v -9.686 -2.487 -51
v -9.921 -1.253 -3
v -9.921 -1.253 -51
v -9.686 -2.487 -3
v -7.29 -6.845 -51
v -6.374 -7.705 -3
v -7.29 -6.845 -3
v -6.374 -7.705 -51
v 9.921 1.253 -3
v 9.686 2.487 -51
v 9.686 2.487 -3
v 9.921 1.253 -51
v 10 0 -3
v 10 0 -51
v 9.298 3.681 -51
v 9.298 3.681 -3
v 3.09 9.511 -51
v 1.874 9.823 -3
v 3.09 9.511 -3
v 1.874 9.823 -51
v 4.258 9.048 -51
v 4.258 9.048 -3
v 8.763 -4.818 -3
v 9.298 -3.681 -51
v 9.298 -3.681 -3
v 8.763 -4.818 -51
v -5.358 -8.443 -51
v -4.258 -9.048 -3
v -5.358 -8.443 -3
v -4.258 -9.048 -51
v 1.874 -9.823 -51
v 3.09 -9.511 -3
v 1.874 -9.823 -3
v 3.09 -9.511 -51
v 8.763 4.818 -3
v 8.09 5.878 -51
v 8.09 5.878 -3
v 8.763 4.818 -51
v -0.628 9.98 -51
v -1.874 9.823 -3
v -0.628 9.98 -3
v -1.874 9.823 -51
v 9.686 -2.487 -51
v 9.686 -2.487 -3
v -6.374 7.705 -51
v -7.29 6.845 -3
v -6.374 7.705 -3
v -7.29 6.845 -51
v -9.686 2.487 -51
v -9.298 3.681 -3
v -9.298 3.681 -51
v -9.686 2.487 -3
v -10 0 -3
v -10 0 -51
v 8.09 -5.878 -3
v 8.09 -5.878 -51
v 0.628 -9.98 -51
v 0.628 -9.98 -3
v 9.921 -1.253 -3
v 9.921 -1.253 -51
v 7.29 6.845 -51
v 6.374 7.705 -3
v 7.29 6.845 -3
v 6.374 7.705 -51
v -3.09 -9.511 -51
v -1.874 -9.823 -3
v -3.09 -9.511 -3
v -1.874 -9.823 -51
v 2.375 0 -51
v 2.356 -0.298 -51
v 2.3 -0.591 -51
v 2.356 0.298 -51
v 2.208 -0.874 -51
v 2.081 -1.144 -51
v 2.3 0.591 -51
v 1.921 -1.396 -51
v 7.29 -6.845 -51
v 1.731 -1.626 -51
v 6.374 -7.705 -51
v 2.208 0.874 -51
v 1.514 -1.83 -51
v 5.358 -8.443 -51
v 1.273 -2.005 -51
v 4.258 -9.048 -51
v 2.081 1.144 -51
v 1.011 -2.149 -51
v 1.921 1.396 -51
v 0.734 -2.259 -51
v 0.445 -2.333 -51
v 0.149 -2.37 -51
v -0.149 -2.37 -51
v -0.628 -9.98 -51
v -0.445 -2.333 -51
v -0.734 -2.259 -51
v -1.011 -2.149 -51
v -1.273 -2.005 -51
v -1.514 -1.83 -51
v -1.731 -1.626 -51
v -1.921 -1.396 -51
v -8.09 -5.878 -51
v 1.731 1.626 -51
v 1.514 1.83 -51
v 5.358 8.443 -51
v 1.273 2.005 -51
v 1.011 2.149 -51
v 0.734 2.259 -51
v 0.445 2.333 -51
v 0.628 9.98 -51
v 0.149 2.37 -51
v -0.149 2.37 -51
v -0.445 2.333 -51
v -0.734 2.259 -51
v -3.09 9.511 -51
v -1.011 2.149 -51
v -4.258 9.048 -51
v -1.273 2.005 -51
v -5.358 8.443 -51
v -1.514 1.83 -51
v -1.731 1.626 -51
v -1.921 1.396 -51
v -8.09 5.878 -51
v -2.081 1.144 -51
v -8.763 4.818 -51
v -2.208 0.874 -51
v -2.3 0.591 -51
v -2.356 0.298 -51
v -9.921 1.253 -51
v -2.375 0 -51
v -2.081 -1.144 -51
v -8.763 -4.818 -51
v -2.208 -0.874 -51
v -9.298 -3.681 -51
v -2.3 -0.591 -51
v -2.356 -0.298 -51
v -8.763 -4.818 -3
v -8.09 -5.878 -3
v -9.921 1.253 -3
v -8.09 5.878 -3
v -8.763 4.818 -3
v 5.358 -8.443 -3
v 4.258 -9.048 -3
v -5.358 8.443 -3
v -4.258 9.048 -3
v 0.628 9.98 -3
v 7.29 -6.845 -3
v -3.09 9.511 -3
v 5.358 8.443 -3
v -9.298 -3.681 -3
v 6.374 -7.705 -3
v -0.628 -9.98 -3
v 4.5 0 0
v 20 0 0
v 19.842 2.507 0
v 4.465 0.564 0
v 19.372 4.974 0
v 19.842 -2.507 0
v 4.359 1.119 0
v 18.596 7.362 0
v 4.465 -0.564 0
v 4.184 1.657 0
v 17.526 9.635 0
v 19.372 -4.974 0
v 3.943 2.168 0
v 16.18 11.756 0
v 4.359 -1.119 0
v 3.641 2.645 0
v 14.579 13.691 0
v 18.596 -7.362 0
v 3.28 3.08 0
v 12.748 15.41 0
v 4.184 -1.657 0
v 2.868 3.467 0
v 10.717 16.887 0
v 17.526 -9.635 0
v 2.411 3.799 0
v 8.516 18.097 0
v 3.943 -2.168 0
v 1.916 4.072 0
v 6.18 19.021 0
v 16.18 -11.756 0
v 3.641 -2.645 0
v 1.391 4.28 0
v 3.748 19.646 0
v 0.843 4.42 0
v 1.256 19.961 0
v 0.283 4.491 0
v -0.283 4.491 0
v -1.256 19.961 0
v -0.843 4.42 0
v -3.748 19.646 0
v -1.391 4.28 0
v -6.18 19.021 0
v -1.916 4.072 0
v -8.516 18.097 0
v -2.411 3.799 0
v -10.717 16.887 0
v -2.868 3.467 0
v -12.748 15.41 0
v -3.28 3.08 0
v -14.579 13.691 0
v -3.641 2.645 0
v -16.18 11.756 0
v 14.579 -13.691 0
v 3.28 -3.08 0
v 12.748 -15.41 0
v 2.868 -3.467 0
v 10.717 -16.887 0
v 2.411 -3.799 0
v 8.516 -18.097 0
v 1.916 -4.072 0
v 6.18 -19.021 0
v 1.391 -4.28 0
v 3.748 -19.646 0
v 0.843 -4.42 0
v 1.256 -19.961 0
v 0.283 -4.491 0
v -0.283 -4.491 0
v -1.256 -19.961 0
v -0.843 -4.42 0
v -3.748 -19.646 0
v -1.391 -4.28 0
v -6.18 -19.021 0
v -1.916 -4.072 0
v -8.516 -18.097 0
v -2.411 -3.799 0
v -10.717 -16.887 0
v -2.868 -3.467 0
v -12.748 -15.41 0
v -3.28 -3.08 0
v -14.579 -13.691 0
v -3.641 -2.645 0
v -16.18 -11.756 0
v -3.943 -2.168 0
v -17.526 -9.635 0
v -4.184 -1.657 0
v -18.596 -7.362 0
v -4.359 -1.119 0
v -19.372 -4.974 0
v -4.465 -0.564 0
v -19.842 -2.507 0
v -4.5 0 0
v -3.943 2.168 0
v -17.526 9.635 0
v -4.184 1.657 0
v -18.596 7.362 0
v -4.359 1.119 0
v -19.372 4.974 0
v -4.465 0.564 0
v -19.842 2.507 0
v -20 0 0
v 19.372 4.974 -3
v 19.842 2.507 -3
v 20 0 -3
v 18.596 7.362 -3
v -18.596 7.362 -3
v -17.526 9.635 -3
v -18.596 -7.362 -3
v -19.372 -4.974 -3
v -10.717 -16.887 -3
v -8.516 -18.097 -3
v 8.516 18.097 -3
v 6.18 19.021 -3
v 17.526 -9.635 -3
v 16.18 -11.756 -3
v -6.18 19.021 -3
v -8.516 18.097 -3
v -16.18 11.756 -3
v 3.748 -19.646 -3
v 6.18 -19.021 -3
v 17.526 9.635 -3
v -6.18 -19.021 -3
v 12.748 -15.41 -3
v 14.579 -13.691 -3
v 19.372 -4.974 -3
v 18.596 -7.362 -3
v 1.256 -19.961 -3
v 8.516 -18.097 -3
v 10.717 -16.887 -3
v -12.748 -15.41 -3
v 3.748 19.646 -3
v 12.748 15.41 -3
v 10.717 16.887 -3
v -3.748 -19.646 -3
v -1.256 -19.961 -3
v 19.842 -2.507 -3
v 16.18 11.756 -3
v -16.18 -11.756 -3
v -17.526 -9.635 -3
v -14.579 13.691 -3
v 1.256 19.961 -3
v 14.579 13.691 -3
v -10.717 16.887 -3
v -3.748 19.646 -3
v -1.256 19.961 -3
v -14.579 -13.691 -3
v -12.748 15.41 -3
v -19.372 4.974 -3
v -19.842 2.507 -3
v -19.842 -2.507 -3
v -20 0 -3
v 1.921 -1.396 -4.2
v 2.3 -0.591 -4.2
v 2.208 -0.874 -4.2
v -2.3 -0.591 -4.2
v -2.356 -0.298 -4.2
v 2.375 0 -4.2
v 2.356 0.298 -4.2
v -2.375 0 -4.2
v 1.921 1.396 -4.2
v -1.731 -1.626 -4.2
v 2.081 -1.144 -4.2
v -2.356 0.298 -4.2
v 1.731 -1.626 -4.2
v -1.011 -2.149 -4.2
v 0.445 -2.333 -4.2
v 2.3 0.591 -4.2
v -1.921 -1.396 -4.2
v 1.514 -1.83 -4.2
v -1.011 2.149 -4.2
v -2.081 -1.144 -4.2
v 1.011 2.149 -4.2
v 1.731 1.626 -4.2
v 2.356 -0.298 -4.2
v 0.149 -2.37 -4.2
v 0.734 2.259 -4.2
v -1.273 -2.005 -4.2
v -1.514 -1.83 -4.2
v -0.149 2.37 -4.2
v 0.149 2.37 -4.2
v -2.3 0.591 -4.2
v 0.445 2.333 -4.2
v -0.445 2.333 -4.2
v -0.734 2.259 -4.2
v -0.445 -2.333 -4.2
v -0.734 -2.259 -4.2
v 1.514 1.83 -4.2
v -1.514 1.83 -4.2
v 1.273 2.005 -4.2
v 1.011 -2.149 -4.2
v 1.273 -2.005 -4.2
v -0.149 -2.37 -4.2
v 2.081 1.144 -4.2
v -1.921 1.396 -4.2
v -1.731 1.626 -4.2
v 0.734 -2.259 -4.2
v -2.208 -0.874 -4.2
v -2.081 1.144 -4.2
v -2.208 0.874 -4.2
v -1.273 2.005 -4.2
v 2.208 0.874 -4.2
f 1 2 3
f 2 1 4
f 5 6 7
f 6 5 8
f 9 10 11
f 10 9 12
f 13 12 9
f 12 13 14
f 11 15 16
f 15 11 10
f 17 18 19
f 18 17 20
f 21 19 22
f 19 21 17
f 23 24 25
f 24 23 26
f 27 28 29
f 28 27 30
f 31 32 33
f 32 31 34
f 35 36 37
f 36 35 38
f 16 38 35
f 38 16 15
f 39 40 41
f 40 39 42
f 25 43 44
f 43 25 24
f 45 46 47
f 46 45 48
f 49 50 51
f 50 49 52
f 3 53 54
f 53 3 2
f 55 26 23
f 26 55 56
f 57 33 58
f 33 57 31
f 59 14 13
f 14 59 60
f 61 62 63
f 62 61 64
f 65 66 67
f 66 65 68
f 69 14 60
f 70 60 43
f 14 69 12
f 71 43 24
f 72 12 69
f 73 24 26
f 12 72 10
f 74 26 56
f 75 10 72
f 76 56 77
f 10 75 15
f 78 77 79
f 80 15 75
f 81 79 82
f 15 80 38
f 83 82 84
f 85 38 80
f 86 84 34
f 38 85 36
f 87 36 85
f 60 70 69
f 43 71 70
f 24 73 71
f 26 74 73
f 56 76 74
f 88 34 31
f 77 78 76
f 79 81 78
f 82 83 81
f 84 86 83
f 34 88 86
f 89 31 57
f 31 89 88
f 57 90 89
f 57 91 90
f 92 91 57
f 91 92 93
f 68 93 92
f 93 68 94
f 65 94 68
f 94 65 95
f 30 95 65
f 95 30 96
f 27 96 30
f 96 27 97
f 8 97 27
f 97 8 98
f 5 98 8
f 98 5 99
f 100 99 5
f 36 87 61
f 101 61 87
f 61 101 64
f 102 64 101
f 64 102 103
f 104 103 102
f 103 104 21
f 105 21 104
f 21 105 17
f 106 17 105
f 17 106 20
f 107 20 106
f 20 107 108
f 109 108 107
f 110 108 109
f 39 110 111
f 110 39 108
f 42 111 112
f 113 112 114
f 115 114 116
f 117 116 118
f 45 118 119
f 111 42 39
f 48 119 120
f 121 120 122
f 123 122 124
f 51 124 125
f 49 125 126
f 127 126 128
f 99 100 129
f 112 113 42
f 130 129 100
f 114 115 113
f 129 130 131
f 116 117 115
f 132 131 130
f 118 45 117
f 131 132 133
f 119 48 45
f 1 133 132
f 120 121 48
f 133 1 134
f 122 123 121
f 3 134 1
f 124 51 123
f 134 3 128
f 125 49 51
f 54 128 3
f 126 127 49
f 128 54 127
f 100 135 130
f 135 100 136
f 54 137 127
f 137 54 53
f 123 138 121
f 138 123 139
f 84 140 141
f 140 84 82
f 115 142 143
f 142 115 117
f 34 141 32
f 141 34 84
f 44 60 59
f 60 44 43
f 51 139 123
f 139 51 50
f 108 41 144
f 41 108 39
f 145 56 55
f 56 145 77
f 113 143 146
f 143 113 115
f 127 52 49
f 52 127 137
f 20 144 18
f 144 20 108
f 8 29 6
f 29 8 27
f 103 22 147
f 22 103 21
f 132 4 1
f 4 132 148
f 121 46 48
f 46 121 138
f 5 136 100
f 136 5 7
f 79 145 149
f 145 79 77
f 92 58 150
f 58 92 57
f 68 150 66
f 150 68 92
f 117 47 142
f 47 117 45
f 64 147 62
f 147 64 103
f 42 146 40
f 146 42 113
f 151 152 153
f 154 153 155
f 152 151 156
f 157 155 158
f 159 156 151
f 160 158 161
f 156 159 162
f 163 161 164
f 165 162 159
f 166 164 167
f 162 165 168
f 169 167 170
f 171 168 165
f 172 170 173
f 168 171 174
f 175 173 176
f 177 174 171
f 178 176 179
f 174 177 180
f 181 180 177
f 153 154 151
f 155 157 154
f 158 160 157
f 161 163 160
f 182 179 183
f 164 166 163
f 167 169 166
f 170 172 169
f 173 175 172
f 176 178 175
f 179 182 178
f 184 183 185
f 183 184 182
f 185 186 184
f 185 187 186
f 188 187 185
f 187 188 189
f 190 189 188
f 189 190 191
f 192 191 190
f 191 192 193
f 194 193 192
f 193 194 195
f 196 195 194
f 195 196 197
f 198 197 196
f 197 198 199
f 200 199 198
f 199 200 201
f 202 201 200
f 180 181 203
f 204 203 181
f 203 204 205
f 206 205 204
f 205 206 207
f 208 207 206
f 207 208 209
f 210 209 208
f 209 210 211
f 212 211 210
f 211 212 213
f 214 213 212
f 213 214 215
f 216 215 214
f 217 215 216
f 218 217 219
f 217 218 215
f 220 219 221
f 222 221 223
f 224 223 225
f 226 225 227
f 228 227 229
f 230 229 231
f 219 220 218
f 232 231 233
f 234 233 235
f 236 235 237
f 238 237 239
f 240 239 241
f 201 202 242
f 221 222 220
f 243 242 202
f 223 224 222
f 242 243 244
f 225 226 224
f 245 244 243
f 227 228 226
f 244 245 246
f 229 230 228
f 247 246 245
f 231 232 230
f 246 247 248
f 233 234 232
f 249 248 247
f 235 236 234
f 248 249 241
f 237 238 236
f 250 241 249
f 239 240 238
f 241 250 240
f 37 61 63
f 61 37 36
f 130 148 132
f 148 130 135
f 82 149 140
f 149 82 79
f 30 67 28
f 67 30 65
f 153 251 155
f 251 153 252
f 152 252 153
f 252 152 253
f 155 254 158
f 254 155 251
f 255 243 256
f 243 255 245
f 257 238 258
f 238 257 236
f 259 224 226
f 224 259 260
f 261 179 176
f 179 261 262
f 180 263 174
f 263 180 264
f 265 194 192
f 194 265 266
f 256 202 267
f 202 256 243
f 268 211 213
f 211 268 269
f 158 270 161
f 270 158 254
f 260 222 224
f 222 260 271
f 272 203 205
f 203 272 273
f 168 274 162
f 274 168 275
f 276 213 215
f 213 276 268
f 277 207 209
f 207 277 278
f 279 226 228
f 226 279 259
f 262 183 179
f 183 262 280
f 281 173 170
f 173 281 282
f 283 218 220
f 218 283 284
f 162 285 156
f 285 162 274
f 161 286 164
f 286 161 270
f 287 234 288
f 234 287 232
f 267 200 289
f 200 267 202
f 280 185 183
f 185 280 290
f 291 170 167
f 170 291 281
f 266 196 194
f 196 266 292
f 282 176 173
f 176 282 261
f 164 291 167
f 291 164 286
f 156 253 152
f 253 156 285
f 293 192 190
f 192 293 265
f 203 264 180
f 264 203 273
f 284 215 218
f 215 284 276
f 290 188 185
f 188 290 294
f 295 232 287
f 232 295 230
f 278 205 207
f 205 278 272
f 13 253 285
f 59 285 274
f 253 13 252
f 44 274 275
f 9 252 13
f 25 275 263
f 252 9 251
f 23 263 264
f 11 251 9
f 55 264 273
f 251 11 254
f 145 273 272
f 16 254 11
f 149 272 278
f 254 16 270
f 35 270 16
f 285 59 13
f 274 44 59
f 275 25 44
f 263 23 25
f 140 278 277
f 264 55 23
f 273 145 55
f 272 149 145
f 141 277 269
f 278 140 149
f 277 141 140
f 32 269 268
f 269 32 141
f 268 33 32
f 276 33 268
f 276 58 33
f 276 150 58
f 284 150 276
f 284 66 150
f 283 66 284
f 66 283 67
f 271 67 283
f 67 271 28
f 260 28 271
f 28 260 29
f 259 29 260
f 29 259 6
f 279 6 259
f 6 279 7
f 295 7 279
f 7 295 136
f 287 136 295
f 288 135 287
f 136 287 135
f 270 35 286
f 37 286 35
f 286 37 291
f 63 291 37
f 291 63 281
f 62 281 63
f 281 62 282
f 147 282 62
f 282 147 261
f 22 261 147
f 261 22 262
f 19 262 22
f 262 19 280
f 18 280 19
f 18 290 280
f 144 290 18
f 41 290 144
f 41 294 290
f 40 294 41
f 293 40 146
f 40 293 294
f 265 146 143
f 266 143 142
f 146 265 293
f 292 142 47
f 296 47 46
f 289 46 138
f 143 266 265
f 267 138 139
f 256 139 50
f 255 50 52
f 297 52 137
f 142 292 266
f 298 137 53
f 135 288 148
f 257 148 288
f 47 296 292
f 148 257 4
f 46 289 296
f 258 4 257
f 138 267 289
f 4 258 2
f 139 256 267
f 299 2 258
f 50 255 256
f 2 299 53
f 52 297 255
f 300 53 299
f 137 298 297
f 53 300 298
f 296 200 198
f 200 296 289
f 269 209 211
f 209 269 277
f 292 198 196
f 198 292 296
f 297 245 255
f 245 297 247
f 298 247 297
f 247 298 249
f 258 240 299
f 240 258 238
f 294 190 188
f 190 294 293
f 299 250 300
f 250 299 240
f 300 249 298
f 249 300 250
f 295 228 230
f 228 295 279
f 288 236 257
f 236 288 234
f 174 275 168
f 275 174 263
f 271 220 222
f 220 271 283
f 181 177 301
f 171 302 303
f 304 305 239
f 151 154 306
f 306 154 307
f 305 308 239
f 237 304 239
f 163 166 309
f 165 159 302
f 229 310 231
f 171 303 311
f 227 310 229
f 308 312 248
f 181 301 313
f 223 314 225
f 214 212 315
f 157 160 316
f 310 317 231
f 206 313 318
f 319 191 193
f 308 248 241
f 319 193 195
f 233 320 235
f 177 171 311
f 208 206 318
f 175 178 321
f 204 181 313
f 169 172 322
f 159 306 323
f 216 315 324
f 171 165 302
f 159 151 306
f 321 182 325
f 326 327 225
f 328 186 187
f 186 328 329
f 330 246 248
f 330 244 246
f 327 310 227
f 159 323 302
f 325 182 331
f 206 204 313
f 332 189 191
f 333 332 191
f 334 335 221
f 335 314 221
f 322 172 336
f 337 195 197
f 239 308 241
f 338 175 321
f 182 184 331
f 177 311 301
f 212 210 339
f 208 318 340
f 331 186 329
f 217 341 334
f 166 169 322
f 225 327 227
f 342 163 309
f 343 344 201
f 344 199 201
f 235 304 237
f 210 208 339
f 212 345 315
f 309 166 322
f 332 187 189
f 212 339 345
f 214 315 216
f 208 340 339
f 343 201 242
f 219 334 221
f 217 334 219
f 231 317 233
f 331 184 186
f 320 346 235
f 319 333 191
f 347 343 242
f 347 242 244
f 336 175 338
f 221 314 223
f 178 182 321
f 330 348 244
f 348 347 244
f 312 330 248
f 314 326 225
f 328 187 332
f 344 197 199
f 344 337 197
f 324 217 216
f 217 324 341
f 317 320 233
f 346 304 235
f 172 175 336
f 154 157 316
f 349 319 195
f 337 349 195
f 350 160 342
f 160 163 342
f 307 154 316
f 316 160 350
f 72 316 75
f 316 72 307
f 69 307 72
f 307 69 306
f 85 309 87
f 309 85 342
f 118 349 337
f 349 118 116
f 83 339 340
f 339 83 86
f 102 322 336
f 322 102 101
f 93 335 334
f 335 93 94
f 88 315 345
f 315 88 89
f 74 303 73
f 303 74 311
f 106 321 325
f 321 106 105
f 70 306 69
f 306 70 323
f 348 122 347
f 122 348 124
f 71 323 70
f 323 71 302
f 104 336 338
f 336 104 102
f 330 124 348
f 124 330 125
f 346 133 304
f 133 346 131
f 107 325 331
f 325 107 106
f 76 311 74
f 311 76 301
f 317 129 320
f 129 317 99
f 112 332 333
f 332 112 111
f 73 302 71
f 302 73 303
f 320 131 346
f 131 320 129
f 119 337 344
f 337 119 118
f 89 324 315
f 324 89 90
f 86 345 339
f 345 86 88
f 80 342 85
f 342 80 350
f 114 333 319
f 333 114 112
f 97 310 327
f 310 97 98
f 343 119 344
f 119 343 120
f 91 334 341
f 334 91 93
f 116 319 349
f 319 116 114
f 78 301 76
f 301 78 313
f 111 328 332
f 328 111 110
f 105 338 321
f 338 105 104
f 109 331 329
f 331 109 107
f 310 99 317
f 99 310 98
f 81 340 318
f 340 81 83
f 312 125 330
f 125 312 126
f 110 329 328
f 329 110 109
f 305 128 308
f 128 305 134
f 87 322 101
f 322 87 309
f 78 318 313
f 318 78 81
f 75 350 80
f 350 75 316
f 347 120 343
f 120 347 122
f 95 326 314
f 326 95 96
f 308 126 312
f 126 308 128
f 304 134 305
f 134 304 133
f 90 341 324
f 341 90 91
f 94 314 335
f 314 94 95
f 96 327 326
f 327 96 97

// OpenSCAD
$fn = 50;


difference() {
	union() {
		translate(v = [0, 0, -51.0000000000]) {
			cylinder(h = 51, r = 10.0000000000);
		}
		translate(v = [0, 0, -3.0000000000]) {
			cylinder(h = 3, r = 20.0000000000);
		}
	}
	union() {
		translate(v = [0, 0, 0]) {
			rotate(a = [0, 0, 0]) {
				difference() {
					union() {
						#translate(v = [0, 0, -51.0000000000]) {
							cylinder(h = 51, r = 2.2500000000);
						}
						#translate(v = [0, 0, -4.2000000000]) {
							cylinder(h = 4.2000000000, r = 10.0000000000, r1 = 2.3750000000, r2 = 4.5000000000);
						}
						#translate(v = [0, 0, -51.0000000000]) {
							cylinder(h = 51, r = 2.3750000000);
						}
						#translate(v = [0, 0, -51.0000000000]) {
							cylinder(h = 51, r = 2.2500000000);
						}
					}
					union();
				}
			}
		}
	}
}
